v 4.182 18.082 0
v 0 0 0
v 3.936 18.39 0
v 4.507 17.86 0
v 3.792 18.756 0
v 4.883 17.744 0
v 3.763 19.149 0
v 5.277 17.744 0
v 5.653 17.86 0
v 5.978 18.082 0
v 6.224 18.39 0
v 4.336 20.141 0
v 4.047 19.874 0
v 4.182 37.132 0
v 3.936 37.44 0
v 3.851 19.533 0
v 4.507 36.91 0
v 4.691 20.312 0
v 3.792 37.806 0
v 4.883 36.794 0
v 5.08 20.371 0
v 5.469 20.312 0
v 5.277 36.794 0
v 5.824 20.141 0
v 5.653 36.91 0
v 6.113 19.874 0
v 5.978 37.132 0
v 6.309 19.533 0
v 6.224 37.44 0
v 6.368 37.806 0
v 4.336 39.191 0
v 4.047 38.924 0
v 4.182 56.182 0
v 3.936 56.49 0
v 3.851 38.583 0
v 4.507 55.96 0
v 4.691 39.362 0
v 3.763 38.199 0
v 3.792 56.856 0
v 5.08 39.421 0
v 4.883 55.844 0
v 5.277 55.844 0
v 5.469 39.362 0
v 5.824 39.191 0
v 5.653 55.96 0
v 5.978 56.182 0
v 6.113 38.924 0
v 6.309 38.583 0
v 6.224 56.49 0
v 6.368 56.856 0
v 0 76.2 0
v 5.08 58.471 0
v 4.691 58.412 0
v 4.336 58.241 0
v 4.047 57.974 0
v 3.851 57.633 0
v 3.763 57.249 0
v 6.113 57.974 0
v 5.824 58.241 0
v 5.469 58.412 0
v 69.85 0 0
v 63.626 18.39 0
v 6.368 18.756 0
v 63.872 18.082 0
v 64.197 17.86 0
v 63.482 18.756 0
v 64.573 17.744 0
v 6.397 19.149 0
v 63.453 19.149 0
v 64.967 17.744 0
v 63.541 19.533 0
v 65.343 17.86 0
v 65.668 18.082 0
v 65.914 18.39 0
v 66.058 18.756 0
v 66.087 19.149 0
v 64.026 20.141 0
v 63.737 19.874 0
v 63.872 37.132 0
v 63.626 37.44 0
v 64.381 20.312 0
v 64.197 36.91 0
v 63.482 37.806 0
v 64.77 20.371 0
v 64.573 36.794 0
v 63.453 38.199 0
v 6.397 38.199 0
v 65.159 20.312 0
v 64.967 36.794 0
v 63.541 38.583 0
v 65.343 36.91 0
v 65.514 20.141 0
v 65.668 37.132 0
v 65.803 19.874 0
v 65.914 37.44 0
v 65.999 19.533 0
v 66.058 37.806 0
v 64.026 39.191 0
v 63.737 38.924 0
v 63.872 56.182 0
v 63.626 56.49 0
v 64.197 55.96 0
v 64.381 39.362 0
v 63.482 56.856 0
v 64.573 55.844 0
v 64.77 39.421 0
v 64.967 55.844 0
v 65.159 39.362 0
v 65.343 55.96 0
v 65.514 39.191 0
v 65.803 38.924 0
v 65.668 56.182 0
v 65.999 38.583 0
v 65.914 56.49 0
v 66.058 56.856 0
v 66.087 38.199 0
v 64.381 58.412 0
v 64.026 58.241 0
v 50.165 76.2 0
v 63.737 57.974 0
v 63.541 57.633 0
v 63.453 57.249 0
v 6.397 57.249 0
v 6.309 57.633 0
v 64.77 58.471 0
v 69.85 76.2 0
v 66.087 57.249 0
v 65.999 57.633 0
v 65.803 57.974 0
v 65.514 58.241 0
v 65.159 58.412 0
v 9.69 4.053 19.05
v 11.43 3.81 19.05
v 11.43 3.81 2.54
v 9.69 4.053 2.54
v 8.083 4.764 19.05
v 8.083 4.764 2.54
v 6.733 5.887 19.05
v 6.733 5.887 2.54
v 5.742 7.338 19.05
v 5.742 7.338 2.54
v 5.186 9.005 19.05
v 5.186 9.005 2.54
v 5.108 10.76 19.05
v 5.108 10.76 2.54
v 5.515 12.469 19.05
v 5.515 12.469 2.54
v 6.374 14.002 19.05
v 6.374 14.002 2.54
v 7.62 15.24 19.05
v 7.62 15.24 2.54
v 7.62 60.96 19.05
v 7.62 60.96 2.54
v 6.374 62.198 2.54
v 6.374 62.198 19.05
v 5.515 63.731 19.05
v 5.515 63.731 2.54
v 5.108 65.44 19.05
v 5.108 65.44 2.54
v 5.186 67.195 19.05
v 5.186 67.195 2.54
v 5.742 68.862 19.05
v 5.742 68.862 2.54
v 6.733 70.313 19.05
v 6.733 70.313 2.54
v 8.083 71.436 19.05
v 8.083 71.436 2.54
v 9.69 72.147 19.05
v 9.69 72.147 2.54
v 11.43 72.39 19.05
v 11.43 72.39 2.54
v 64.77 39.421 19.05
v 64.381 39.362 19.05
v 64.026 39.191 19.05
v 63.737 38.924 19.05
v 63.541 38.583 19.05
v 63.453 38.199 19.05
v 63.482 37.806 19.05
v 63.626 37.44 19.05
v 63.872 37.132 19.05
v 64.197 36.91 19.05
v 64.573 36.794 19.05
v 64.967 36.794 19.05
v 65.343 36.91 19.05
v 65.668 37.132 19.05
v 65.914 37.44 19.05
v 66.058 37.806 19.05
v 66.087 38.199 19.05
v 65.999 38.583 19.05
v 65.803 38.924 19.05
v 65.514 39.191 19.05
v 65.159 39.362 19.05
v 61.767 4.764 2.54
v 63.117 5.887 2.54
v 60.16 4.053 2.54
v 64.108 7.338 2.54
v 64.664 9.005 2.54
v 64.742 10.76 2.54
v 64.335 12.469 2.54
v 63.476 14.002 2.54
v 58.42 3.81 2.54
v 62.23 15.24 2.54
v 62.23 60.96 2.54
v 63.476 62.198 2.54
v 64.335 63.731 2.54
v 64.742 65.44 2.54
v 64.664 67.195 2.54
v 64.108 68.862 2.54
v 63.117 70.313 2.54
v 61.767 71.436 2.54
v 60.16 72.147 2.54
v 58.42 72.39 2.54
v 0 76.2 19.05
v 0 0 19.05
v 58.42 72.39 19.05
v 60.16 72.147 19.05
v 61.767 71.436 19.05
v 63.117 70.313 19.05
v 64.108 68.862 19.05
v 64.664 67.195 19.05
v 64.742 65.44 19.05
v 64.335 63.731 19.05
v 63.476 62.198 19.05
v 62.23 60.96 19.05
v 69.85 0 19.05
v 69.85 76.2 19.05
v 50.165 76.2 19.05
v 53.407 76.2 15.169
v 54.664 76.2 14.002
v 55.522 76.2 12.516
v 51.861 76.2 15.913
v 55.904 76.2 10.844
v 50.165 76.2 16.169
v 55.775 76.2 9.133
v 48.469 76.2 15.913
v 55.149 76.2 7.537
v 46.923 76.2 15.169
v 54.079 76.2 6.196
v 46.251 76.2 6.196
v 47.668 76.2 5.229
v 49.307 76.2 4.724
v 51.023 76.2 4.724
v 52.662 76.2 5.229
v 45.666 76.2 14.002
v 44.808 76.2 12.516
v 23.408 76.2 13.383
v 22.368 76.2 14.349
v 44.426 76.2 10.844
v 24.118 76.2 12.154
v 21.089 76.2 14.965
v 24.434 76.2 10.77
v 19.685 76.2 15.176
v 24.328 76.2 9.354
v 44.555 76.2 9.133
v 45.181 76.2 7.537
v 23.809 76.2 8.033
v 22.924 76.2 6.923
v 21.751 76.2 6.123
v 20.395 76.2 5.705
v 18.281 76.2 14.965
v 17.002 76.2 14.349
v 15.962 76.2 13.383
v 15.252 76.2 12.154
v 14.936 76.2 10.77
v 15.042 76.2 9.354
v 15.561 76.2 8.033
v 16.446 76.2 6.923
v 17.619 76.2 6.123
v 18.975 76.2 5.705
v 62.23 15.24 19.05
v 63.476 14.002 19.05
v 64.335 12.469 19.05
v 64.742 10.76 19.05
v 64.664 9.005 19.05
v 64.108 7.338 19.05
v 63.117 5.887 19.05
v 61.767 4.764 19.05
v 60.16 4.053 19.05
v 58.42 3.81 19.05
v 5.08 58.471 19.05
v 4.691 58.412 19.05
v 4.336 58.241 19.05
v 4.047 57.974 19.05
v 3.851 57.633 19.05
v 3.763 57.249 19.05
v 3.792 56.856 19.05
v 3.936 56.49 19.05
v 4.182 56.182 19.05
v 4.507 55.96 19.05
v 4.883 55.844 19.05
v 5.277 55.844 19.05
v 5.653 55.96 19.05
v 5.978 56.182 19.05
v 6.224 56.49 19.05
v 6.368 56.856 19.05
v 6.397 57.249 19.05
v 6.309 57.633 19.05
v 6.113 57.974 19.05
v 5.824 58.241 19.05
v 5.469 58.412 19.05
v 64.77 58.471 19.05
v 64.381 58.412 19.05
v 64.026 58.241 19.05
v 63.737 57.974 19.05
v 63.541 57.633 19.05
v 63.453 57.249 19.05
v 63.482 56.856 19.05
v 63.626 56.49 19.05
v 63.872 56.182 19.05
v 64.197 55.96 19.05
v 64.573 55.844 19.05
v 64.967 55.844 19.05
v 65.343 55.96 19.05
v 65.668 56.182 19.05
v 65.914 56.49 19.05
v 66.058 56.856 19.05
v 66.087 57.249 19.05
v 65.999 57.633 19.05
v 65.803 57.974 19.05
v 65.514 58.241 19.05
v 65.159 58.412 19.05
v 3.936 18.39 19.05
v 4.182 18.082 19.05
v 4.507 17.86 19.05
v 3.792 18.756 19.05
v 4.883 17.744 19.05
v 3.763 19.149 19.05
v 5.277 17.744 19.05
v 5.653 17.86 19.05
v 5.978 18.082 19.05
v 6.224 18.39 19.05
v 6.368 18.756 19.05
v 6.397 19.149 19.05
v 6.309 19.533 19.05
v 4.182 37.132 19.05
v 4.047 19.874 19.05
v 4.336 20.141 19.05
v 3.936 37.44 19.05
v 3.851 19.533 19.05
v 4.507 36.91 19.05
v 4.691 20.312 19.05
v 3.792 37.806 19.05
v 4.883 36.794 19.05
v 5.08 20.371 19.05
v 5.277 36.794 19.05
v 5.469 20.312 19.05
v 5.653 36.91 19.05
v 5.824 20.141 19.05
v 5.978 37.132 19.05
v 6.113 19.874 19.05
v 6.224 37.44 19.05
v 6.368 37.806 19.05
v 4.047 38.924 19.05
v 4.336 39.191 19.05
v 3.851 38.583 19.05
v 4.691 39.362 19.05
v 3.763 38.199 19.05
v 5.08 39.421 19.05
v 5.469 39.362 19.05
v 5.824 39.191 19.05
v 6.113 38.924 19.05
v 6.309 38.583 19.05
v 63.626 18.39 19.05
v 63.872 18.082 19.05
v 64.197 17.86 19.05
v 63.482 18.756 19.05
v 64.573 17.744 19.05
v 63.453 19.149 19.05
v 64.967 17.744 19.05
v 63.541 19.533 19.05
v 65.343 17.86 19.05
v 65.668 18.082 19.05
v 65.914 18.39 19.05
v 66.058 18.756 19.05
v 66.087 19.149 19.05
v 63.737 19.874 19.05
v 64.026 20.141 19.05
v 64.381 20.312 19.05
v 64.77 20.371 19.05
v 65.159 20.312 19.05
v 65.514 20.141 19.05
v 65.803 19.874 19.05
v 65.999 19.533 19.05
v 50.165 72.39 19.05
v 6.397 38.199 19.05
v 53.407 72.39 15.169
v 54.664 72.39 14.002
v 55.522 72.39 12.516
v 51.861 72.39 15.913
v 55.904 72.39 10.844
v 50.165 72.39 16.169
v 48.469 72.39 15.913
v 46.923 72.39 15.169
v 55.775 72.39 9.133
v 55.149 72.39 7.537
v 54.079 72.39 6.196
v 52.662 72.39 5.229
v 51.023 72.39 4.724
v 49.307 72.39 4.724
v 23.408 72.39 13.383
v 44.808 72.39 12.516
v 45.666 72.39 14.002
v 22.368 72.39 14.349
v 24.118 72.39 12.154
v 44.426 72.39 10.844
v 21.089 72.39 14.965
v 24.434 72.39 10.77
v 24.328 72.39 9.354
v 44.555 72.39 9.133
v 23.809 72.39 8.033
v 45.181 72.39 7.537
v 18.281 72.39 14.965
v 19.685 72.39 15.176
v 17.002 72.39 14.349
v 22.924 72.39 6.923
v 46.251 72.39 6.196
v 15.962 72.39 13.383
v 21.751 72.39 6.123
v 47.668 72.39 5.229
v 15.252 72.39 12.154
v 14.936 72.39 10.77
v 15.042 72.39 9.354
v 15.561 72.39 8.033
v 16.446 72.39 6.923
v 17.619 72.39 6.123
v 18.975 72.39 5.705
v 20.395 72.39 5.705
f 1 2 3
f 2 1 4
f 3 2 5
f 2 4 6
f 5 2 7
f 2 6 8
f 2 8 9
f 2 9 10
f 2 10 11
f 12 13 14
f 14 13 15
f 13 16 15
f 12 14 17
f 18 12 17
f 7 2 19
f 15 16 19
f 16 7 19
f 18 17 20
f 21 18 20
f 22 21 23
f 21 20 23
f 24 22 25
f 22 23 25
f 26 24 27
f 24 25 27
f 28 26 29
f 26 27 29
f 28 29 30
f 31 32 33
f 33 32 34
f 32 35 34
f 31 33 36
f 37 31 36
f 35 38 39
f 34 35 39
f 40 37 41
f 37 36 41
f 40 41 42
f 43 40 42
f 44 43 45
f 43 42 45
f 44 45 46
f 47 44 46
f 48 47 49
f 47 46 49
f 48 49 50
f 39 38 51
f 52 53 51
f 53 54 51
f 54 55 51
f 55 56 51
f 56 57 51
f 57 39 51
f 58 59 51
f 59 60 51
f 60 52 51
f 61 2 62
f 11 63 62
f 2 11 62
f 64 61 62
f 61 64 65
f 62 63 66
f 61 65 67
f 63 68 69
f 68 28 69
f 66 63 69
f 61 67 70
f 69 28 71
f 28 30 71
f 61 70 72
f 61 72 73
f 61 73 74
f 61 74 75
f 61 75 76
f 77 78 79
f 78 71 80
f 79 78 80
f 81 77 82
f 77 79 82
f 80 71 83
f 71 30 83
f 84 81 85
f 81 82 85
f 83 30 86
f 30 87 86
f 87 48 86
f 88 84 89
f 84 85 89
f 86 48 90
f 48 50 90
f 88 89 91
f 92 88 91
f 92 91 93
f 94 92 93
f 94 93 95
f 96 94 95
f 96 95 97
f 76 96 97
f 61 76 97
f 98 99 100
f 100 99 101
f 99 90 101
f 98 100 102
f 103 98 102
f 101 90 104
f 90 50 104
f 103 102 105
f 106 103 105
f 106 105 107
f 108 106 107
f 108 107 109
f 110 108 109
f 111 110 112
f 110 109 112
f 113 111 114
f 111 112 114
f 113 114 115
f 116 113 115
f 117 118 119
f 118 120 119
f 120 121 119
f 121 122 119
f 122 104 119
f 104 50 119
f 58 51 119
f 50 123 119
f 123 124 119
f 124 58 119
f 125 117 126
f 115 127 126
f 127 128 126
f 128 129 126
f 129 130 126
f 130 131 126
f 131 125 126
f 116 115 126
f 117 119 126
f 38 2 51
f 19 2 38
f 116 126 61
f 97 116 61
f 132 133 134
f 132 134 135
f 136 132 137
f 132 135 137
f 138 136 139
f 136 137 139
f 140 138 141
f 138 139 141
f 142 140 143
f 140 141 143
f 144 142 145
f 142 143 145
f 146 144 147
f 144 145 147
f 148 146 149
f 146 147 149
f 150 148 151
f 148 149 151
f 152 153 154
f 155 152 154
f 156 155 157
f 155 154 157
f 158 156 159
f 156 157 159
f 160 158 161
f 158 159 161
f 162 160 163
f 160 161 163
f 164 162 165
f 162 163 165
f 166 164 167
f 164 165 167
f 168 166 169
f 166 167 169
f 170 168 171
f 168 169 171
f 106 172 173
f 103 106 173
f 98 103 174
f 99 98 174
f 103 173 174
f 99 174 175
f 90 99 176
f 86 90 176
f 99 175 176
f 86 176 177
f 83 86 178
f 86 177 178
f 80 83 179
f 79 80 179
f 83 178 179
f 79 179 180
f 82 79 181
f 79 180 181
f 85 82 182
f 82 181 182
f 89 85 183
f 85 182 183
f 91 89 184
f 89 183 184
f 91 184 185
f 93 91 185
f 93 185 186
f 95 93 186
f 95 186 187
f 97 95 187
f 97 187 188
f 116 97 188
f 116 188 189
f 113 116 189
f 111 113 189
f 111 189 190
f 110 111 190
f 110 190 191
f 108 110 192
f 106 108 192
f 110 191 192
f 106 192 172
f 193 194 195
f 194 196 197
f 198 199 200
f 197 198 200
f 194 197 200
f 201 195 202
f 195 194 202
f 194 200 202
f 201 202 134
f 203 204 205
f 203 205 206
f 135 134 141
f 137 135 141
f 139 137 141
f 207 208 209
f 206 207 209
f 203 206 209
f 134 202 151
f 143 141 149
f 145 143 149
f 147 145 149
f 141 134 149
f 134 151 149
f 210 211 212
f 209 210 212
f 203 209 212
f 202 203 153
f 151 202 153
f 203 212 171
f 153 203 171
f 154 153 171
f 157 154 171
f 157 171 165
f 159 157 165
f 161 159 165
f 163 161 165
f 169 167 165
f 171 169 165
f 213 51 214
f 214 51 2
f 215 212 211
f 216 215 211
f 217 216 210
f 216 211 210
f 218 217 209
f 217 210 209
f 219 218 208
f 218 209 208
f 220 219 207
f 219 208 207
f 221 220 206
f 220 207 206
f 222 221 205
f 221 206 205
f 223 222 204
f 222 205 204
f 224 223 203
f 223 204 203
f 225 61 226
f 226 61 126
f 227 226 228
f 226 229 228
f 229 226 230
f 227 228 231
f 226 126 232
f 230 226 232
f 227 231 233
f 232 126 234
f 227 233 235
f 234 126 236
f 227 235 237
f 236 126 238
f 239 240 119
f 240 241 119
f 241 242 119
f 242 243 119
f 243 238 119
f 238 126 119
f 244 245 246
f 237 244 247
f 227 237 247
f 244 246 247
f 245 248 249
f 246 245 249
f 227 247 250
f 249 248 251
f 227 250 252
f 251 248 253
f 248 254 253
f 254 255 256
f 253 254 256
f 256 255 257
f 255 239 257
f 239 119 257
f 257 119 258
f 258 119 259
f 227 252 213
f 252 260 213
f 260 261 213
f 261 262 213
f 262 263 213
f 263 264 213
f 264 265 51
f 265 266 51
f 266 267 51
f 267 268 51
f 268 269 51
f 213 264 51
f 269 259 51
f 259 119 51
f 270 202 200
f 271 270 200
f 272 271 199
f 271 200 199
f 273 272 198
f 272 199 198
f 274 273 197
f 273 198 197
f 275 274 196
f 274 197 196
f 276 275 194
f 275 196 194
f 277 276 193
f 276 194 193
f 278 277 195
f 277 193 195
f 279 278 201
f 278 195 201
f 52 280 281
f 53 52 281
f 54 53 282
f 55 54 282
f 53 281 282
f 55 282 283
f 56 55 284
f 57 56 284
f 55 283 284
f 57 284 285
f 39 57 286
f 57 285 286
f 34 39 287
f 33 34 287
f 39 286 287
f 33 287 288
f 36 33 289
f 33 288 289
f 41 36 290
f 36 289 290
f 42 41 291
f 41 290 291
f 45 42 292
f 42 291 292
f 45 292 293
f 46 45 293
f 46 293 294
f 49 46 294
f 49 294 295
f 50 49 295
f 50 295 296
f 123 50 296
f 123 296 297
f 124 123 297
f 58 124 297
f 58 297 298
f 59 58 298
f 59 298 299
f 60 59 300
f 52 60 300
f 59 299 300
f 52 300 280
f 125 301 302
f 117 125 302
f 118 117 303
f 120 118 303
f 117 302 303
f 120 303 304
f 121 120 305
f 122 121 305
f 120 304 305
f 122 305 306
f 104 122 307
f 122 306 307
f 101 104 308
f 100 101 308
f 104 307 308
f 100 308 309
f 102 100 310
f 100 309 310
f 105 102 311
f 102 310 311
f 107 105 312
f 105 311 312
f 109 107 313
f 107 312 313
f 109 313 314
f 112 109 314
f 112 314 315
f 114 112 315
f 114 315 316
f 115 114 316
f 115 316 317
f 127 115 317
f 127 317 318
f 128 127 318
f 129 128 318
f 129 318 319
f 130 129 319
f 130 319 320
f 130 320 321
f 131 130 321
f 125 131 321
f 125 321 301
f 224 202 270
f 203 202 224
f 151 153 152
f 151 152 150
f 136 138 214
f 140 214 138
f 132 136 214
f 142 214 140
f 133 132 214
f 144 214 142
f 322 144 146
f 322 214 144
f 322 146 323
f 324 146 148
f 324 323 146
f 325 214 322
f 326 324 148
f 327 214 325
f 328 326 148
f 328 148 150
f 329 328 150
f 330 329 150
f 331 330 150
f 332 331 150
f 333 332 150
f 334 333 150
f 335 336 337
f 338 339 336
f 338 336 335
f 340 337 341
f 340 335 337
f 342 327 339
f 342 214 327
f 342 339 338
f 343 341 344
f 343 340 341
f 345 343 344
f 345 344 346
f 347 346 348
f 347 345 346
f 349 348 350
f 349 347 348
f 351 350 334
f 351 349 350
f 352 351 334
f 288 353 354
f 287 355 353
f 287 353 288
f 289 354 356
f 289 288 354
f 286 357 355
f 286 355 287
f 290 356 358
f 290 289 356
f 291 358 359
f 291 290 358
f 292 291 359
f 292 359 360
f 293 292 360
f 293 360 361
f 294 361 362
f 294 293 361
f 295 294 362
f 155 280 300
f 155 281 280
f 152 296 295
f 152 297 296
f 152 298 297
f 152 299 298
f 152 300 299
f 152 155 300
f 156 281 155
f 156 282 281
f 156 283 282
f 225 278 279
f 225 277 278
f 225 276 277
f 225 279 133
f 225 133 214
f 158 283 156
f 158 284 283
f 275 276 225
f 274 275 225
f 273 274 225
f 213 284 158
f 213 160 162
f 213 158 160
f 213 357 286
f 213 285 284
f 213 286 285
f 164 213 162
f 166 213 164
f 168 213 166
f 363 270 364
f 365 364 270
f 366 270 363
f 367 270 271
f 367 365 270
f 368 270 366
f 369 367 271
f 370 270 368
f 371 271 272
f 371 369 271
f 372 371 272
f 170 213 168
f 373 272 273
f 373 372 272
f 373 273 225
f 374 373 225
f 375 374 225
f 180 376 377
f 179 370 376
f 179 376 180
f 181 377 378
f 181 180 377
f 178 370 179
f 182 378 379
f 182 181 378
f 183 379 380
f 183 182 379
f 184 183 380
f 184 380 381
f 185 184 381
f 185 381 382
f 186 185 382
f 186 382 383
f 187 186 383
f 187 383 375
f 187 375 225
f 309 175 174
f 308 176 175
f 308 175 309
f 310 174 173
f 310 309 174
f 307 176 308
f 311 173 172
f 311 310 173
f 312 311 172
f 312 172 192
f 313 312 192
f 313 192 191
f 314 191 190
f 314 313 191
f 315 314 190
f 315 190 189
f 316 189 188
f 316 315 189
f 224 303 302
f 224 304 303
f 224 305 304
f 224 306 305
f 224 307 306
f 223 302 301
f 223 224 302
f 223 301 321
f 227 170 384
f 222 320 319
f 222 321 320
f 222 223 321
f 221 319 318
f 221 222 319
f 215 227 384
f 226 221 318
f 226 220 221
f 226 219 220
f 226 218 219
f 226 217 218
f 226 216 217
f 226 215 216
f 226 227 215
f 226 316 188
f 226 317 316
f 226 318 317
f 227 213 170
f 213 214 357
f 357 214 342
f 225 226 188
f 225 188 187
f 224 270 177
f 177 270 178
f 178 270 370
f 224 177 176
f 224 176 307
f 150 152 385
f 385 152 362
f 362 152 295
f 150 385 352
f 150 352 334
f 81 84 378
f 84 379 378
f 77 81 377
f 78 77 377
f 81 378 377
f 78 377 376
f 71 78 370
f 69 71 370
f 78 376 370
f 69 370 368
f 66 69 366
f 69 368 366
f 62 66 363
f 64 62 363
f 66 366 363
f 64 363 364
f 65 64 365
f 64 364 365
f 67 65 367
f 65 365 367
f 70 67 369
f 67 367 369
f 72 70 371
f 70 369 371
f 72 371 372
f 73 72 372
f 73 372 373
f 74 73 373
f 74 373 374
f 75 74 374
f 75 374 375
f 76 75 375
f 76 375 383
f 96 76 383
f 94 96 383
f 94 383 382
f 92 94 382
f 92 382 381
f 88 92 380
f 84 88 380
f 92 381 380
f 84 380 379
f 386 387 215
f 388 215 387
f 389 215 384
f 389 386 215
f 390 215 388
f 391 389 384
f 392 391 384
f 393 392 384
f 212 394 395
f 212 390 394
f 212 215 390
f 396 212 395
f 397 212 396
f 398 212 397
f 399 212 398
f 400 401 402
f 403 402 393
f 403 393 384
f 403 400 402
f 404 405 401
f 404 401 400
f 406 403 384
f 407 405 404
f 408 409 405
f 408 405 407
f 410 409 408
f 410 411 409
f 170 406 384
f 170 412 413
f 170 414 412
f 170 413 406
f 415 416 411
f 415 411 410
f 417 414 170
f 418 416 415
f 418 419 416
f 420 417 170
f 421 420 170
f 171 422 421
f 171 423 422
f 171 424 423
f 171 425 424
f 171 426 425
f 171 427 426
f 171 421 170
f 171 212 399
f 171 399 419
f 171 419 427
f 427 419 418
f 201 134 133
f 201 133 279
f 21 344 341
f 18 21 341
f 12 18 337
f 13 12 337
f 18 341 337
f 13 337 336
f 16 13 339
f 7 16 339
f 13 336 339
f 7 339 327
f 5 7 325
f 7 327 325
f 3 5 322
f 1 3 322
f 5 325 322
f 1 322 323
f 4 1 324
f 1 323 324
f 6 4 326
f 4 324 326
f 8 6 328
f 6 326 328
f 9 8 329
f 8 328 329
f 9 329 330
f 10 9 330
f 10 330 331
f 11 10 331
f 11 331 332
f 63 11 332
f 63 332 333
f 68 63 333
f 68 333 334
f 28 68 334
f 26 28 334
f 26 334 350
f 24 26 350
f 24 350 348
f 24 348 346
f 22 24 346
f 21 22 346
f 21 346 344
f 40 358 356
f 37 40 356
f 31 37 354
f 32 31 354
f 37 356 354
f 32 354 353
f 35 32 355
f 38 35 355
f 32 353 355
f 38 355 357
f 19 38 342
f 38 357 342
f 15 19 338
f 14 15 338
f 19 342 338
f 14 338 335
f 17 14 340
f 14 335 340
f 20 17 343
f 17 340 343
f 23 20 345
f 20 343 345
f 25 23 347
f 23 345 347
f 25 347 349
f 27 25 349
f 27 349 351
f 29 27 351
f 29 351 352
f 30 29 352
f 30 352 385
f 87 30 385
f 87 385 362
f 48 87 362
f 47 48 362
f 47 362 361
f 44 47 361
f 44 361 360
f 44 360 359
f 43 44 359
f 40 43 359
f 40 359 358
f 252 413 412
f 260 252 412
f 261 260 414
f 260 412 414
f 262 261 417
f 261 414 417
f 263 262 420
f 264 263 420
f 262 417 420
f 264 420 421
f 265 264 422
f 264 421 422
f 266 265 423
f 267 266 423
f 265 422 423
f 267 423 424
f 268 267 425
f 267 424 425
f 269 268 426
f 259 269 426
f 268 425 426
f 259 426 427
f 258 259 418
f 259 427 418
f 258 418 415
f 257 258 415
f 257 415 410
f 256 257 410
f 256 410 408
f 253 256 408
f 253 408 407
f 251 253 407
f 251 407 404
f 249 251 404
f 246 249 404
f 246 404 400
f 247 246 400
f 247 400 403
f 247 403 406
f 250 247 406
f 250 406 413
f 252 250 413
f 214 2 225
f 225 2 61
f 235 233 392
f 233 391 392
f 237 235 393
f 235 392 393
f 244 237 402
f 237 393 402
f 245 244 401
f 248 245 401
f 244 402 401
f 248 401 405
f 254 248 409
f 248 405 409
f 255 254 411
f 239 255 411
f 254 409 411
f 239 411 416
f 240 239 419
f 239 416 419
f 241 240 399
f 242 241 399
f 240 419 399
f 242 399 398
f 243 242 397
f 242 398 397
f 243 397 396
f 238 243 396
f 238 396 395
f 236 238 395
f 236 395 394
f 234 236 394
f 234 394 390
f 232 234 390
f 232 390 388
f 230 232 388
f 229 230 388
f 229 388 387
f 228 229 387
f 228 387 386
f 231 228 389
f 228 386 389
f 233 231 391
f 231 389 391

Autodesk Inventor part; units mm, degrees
ref_plane "YZ Plane" through (0, 0, 0) normal (1, 0, 0) x (0, 1, 0)
ref_plane "XZ Plane" through (0, 0, 0) normal (0, 1, 0) x (-1, 0, 0)
ref_plane "XY Plane" through (0, 0, 0) normal (0, 0, 1) x (1, 0, 0)
sketch "Sketch1" plane through (0, 0, 0) normal (0, 0, 1) x (1, 0, 0)
  line L0 (0, 0) -> (69.85, 0)
  line L1 (69.85, 0) -> (69.85, 76.2)
  line L2 (69.85, 76.2) -> (0, 76.2)
  line L3 (0, 76.2) -> (0, 0)
  line L4 (0, 76.2) -> (7.62, 76.2)
  line L5 (7.62, 3.81) -> (62.23, 3.81)
  line L6 (58.42, 72.39) -> (7.62, 72.39)
  line L7 (7.62, 72.39) -> (11.43, 72.39)
  line L8 (0, 76.2) -> (69.85, 76.2)
  line L9 (34.925, 76.2) -> (50.165, 76.2)
  line L10 (50.165, 76.2) -> (50.165, 69.1676)
  line L11 (34.925, 76.2) -> (19.685, 76.2)
  line L12 (19.685, 76.2) -> (14.9225, 76.2)
  line L13 (0, 76.2) -> (0, 57.15)
  line L14 (19.685, 76.2) -> (13.9303, 76.2)
  arc A0 (11.43, 72.39) -> (7.62, 60.96) centre (11.43, 66.04) ccw
  line L15 (7.62, 3.81) -> (11.43, 3.81)
  line L16 (11.43, 3.81) -> (11.43, 10.16)
  line L17 (62.23, 3.81) -> (58.42, 3.81)
  line L18 (58.42, 3.81) -> (58.42, 10.16)
  arc A1 (7.62, 15.24) -> (11.43, 3.81) centre (11.43, 10.16) ccw
  arc A2 (58.42, 3.81) -> (62.23, 15.24) centre (58.42, 10.16) ccw
  arc A3 (62.23, 60.96) -> (58.42, 72.39) centre (58.42, 66.04) ccw
  line L19 (62.23, 15.24) -> (62.23, 60.96)
  line L20 (7.62, 60.96) -> (7.62, 15.24)
  dimension "d9" = 7.62
  dimension "d13" = 15.24
  dimension "d18" = 19.05
  dimension "d24" = 6.35
  dimension "d25" = 3.81
  dimension "d26" = 6.35
extrude "Extrusion1" add sketch "Sketch1" along normal blind 19.05
sketch "Sketch3" plane through (0, 0, 0) normal (0, 0, -1) x (-1, 0, 0)
  arc A0 (-11.43, 3.81) -> (-7.62, 15.24) centre (-11.43, 10.16) ccw projected
  line L0 (-11.43, 3.81) -> (-58.42, 3.81) projected
  arc A1 (-62.23, 15.24) -> (-58.42, 3.81) centre (-58.42, 10.16) ccw projected
  line L1 (-62.23, 15.24) -> (-62.23, 60.96) projected
  arc A2 (-58.42, 72.39) -> (-62.23, 60.96) centre (-58.42, 66.04) ccw projected
  line L2 (-58.42, 72.39) -> (-11.43, 72.39) projected
  arc A3 (-7.62, 60.96) -> (-11.43, 72.39) centre (-11.43, 66.04) ccw projected
  line L3 (-7.62, 60.96) -> (-7.62, 15.24) projected
  line L4 (0, 76.2) -> (0, 0) projected
  line L5 (-69.85, 76.2) -> (0, 76.2) projected
  line L6 (-69.85, 0) -> (-69.85, 76.2) projected
  line L7 (0, 0) -> (-69.85, 0) projected
  line L8 (0, 76.2) -> (-5.08, 76.2)
  line L9 (-69.85, 76.2) -> (0, 76.2) projected
  line L10 (-5.08, 76.2) -> (-5.08, 0)
  line L11 (-5.08, 76.2) -> (-5.08, 57.15)
  line L12 (-5.08, 0) -> (-5.08, 19.05)
  line L13 (-69.85, 0) -> (-64.77, 0)
  line L14 (0, 0) -> (-69.85, 0) projected
  line L15 (-64.77, 0) -> (-64.77, 19.05)
  line L16 (-69.85, 76.2) -> (-64.77, 76.2)
  line L17 (-64.77, 76.2) -> (-64.77, 57.15)
  line L18 (-64.77, 57.15) -> (-64.77, 38.1)
  line L19 (-5.08, 57.15) -> (-5.08, 38.1)
  dimension "d31" = 5.08
  dimension "d32" = 19.05
  dimension "d33" = 19.05
  dimension "d34" = 5.08
  dimension "d35" = 19.05
  dimension "d36" = 5.08
  dimension "d37" = 19.05
  dimension "d38" = 19.05
  dimension "d39" = 19.05
hole "Hole1" at (64.77, 57.15, 0) at (64.77, 38.1, 0) at (64.77, 19.05, 0) at (5.08, 19.05, 0) at (5.08, 38.1, 0) at (5.08, 57.15, 0) direction (0, 0, 1) diameter 2.6416 depth 23.0124 tip angle 118 thread size "6-32 UNC" class "2B" standard "ANSI Unified Screw Threads"
sketch "Sketch7" plane through (0, 0, 0) normal (0, 0, -1) x (-1, 0, 0)
  circle A0 centre (-5.08, 38.1) radius 1.3208 projected
  circle A1 centre (-64.77, 19.05) radius 1.3208 projected
  circle A2 centre (-64.77, 57.15) radius 1.3208 projected
  circle A3 centre (-64.77, 38.1) radius 1.3208 projected
  circle A4 centre (-5.08, 19.05) radius 1.3208 projected
  circle A5 centre (-5.08, 57.15) radius 1.3208 projected
  arc A6 (-11.43, 3.81) -> (-7.62, 15.24) centre (-11.43, 10.16) ccw projected
  line L0 (-11.43, 3.81) -> (-58.42, 3.81) projected
  arc A7 (-62.23, 15.24) -> (-58.42, 3.81) centre (-58.42, 10.16) ccw projected
  line L1 (-62.23, 15.24) -> (-62.23, 60.96) projected
  arc A8 (-58.42, 72.39) -> (-62.23, 60.96) centre (-58.42, 66.04) ccw projected
  line L2 (-58.42, 72.39) -> (-11.43, 72.39) projected
  arc A9 (-7.62, 60.96) -> (-11.43, 72.39) centre (-11.43, 66.04) ccw projected
  line L3 (-7.62, 60.96) -> (-7.62, 15.24) projected
  line L4 (0, 76.2) -> (0, 0) projected
  line L5 (-69.85, 76.2) -> (0, 76.2) projected
  line L6 (-69.85, 0) -> (-69.85, 76.2) projected
  line L7 (0, 0) -> (-69.85, 0) projected
extrude "Extrusion4" add sketch "Sketch7" against normal blind 2.54 contours L0 A7 L1 A8 L2 A9 L3 A6 | L4 L7 L6 L5
sketch "Sketch8" plane through (0, 76.2, 19.05) normal (0, 1, 0) x (1, 0, 0)
  point P0 (0, 19.05)
sketch "Sketch9" plane through (0, 76.2, 19.05) normal (0, 1, 0) x (1, 0, 0)
  line L0 (0, 19.05) -> (0, 0) projected
  line L1 (69.85, 0) -> (0, 0) projected
  line L2 (69.85, 19.05) -> (69.85, 0) projected
  line L3 (69.85, 19.05) -> (0, 19.05) projected
  line L4 (0, 19.05) -> (69.85, 19.05)
  line L5 (0, 19.05) -> (69.85, 19.05) projected
  line L6 (34.925, 19.05) -> (34.925, 8.636)
  line L7 (34.925, 8.636) -> (19.685, 8.636)
  dimension "d74" = 10.414
  dimension "d75" = 15.24
hole "Hole4" at (19.685, 76.2, 10.414) direction (0, -1, 0) diameter 9.525 depth 25.4 tip angle 118
sketch "Sketch10" plane through (0, 76.2, 19.05) normal (0, 1, 0) x (1, 0, 0)
  circle A0 centre (19.685, 8.636) radius 4.7625 projected
  line L0 (0, 19.05) -> (0, 0) projected
  line L1 (69.85, 0) -> (0, 0) projected
  line L2 (69.85, 19.05) -> (69.85, 0) projected
  line L3 (69.85, 19.05) -> (0, 19.05) projected
  line L4 (69.85, 19.05) -> (0, 19.05)
  line L5 (69.85, 19.05) -> (0, 19.05) projected
  line L6 (34.925, 19.05) -> (34.925, 8.636)
  line L7 (34.925, 8.636) -> (50.165, 8.636)
  dimension "d83" = 15.24
  dimension "d91" = 10.414
hole "Hole5" at (50.165, 76.2, 10.414) direction (0, -1, 0) diameter 11.5094 depth 25.4 tip angle 118
sketch "Sketch11" plane through (0, 76.2, 19.05) normal (0, 1, 0) x (1, 0, 0)
  circle A0 centre (50.165, 8.636) radius 5.7547 projected
  circle A1 centre (19.685, 8.636) radius 4.7625 projected
  line L0 (0, 19.05) -> (0, 0) projected
  line L1 (69.85, 0) -> (0, 0) projected
  line L2 (69.85, 19.05) -> (69.85, 0) projected
  line L3 (69.85, 19.05) -> (0, 19.05) projected
properties part number "Light-tight_box"
